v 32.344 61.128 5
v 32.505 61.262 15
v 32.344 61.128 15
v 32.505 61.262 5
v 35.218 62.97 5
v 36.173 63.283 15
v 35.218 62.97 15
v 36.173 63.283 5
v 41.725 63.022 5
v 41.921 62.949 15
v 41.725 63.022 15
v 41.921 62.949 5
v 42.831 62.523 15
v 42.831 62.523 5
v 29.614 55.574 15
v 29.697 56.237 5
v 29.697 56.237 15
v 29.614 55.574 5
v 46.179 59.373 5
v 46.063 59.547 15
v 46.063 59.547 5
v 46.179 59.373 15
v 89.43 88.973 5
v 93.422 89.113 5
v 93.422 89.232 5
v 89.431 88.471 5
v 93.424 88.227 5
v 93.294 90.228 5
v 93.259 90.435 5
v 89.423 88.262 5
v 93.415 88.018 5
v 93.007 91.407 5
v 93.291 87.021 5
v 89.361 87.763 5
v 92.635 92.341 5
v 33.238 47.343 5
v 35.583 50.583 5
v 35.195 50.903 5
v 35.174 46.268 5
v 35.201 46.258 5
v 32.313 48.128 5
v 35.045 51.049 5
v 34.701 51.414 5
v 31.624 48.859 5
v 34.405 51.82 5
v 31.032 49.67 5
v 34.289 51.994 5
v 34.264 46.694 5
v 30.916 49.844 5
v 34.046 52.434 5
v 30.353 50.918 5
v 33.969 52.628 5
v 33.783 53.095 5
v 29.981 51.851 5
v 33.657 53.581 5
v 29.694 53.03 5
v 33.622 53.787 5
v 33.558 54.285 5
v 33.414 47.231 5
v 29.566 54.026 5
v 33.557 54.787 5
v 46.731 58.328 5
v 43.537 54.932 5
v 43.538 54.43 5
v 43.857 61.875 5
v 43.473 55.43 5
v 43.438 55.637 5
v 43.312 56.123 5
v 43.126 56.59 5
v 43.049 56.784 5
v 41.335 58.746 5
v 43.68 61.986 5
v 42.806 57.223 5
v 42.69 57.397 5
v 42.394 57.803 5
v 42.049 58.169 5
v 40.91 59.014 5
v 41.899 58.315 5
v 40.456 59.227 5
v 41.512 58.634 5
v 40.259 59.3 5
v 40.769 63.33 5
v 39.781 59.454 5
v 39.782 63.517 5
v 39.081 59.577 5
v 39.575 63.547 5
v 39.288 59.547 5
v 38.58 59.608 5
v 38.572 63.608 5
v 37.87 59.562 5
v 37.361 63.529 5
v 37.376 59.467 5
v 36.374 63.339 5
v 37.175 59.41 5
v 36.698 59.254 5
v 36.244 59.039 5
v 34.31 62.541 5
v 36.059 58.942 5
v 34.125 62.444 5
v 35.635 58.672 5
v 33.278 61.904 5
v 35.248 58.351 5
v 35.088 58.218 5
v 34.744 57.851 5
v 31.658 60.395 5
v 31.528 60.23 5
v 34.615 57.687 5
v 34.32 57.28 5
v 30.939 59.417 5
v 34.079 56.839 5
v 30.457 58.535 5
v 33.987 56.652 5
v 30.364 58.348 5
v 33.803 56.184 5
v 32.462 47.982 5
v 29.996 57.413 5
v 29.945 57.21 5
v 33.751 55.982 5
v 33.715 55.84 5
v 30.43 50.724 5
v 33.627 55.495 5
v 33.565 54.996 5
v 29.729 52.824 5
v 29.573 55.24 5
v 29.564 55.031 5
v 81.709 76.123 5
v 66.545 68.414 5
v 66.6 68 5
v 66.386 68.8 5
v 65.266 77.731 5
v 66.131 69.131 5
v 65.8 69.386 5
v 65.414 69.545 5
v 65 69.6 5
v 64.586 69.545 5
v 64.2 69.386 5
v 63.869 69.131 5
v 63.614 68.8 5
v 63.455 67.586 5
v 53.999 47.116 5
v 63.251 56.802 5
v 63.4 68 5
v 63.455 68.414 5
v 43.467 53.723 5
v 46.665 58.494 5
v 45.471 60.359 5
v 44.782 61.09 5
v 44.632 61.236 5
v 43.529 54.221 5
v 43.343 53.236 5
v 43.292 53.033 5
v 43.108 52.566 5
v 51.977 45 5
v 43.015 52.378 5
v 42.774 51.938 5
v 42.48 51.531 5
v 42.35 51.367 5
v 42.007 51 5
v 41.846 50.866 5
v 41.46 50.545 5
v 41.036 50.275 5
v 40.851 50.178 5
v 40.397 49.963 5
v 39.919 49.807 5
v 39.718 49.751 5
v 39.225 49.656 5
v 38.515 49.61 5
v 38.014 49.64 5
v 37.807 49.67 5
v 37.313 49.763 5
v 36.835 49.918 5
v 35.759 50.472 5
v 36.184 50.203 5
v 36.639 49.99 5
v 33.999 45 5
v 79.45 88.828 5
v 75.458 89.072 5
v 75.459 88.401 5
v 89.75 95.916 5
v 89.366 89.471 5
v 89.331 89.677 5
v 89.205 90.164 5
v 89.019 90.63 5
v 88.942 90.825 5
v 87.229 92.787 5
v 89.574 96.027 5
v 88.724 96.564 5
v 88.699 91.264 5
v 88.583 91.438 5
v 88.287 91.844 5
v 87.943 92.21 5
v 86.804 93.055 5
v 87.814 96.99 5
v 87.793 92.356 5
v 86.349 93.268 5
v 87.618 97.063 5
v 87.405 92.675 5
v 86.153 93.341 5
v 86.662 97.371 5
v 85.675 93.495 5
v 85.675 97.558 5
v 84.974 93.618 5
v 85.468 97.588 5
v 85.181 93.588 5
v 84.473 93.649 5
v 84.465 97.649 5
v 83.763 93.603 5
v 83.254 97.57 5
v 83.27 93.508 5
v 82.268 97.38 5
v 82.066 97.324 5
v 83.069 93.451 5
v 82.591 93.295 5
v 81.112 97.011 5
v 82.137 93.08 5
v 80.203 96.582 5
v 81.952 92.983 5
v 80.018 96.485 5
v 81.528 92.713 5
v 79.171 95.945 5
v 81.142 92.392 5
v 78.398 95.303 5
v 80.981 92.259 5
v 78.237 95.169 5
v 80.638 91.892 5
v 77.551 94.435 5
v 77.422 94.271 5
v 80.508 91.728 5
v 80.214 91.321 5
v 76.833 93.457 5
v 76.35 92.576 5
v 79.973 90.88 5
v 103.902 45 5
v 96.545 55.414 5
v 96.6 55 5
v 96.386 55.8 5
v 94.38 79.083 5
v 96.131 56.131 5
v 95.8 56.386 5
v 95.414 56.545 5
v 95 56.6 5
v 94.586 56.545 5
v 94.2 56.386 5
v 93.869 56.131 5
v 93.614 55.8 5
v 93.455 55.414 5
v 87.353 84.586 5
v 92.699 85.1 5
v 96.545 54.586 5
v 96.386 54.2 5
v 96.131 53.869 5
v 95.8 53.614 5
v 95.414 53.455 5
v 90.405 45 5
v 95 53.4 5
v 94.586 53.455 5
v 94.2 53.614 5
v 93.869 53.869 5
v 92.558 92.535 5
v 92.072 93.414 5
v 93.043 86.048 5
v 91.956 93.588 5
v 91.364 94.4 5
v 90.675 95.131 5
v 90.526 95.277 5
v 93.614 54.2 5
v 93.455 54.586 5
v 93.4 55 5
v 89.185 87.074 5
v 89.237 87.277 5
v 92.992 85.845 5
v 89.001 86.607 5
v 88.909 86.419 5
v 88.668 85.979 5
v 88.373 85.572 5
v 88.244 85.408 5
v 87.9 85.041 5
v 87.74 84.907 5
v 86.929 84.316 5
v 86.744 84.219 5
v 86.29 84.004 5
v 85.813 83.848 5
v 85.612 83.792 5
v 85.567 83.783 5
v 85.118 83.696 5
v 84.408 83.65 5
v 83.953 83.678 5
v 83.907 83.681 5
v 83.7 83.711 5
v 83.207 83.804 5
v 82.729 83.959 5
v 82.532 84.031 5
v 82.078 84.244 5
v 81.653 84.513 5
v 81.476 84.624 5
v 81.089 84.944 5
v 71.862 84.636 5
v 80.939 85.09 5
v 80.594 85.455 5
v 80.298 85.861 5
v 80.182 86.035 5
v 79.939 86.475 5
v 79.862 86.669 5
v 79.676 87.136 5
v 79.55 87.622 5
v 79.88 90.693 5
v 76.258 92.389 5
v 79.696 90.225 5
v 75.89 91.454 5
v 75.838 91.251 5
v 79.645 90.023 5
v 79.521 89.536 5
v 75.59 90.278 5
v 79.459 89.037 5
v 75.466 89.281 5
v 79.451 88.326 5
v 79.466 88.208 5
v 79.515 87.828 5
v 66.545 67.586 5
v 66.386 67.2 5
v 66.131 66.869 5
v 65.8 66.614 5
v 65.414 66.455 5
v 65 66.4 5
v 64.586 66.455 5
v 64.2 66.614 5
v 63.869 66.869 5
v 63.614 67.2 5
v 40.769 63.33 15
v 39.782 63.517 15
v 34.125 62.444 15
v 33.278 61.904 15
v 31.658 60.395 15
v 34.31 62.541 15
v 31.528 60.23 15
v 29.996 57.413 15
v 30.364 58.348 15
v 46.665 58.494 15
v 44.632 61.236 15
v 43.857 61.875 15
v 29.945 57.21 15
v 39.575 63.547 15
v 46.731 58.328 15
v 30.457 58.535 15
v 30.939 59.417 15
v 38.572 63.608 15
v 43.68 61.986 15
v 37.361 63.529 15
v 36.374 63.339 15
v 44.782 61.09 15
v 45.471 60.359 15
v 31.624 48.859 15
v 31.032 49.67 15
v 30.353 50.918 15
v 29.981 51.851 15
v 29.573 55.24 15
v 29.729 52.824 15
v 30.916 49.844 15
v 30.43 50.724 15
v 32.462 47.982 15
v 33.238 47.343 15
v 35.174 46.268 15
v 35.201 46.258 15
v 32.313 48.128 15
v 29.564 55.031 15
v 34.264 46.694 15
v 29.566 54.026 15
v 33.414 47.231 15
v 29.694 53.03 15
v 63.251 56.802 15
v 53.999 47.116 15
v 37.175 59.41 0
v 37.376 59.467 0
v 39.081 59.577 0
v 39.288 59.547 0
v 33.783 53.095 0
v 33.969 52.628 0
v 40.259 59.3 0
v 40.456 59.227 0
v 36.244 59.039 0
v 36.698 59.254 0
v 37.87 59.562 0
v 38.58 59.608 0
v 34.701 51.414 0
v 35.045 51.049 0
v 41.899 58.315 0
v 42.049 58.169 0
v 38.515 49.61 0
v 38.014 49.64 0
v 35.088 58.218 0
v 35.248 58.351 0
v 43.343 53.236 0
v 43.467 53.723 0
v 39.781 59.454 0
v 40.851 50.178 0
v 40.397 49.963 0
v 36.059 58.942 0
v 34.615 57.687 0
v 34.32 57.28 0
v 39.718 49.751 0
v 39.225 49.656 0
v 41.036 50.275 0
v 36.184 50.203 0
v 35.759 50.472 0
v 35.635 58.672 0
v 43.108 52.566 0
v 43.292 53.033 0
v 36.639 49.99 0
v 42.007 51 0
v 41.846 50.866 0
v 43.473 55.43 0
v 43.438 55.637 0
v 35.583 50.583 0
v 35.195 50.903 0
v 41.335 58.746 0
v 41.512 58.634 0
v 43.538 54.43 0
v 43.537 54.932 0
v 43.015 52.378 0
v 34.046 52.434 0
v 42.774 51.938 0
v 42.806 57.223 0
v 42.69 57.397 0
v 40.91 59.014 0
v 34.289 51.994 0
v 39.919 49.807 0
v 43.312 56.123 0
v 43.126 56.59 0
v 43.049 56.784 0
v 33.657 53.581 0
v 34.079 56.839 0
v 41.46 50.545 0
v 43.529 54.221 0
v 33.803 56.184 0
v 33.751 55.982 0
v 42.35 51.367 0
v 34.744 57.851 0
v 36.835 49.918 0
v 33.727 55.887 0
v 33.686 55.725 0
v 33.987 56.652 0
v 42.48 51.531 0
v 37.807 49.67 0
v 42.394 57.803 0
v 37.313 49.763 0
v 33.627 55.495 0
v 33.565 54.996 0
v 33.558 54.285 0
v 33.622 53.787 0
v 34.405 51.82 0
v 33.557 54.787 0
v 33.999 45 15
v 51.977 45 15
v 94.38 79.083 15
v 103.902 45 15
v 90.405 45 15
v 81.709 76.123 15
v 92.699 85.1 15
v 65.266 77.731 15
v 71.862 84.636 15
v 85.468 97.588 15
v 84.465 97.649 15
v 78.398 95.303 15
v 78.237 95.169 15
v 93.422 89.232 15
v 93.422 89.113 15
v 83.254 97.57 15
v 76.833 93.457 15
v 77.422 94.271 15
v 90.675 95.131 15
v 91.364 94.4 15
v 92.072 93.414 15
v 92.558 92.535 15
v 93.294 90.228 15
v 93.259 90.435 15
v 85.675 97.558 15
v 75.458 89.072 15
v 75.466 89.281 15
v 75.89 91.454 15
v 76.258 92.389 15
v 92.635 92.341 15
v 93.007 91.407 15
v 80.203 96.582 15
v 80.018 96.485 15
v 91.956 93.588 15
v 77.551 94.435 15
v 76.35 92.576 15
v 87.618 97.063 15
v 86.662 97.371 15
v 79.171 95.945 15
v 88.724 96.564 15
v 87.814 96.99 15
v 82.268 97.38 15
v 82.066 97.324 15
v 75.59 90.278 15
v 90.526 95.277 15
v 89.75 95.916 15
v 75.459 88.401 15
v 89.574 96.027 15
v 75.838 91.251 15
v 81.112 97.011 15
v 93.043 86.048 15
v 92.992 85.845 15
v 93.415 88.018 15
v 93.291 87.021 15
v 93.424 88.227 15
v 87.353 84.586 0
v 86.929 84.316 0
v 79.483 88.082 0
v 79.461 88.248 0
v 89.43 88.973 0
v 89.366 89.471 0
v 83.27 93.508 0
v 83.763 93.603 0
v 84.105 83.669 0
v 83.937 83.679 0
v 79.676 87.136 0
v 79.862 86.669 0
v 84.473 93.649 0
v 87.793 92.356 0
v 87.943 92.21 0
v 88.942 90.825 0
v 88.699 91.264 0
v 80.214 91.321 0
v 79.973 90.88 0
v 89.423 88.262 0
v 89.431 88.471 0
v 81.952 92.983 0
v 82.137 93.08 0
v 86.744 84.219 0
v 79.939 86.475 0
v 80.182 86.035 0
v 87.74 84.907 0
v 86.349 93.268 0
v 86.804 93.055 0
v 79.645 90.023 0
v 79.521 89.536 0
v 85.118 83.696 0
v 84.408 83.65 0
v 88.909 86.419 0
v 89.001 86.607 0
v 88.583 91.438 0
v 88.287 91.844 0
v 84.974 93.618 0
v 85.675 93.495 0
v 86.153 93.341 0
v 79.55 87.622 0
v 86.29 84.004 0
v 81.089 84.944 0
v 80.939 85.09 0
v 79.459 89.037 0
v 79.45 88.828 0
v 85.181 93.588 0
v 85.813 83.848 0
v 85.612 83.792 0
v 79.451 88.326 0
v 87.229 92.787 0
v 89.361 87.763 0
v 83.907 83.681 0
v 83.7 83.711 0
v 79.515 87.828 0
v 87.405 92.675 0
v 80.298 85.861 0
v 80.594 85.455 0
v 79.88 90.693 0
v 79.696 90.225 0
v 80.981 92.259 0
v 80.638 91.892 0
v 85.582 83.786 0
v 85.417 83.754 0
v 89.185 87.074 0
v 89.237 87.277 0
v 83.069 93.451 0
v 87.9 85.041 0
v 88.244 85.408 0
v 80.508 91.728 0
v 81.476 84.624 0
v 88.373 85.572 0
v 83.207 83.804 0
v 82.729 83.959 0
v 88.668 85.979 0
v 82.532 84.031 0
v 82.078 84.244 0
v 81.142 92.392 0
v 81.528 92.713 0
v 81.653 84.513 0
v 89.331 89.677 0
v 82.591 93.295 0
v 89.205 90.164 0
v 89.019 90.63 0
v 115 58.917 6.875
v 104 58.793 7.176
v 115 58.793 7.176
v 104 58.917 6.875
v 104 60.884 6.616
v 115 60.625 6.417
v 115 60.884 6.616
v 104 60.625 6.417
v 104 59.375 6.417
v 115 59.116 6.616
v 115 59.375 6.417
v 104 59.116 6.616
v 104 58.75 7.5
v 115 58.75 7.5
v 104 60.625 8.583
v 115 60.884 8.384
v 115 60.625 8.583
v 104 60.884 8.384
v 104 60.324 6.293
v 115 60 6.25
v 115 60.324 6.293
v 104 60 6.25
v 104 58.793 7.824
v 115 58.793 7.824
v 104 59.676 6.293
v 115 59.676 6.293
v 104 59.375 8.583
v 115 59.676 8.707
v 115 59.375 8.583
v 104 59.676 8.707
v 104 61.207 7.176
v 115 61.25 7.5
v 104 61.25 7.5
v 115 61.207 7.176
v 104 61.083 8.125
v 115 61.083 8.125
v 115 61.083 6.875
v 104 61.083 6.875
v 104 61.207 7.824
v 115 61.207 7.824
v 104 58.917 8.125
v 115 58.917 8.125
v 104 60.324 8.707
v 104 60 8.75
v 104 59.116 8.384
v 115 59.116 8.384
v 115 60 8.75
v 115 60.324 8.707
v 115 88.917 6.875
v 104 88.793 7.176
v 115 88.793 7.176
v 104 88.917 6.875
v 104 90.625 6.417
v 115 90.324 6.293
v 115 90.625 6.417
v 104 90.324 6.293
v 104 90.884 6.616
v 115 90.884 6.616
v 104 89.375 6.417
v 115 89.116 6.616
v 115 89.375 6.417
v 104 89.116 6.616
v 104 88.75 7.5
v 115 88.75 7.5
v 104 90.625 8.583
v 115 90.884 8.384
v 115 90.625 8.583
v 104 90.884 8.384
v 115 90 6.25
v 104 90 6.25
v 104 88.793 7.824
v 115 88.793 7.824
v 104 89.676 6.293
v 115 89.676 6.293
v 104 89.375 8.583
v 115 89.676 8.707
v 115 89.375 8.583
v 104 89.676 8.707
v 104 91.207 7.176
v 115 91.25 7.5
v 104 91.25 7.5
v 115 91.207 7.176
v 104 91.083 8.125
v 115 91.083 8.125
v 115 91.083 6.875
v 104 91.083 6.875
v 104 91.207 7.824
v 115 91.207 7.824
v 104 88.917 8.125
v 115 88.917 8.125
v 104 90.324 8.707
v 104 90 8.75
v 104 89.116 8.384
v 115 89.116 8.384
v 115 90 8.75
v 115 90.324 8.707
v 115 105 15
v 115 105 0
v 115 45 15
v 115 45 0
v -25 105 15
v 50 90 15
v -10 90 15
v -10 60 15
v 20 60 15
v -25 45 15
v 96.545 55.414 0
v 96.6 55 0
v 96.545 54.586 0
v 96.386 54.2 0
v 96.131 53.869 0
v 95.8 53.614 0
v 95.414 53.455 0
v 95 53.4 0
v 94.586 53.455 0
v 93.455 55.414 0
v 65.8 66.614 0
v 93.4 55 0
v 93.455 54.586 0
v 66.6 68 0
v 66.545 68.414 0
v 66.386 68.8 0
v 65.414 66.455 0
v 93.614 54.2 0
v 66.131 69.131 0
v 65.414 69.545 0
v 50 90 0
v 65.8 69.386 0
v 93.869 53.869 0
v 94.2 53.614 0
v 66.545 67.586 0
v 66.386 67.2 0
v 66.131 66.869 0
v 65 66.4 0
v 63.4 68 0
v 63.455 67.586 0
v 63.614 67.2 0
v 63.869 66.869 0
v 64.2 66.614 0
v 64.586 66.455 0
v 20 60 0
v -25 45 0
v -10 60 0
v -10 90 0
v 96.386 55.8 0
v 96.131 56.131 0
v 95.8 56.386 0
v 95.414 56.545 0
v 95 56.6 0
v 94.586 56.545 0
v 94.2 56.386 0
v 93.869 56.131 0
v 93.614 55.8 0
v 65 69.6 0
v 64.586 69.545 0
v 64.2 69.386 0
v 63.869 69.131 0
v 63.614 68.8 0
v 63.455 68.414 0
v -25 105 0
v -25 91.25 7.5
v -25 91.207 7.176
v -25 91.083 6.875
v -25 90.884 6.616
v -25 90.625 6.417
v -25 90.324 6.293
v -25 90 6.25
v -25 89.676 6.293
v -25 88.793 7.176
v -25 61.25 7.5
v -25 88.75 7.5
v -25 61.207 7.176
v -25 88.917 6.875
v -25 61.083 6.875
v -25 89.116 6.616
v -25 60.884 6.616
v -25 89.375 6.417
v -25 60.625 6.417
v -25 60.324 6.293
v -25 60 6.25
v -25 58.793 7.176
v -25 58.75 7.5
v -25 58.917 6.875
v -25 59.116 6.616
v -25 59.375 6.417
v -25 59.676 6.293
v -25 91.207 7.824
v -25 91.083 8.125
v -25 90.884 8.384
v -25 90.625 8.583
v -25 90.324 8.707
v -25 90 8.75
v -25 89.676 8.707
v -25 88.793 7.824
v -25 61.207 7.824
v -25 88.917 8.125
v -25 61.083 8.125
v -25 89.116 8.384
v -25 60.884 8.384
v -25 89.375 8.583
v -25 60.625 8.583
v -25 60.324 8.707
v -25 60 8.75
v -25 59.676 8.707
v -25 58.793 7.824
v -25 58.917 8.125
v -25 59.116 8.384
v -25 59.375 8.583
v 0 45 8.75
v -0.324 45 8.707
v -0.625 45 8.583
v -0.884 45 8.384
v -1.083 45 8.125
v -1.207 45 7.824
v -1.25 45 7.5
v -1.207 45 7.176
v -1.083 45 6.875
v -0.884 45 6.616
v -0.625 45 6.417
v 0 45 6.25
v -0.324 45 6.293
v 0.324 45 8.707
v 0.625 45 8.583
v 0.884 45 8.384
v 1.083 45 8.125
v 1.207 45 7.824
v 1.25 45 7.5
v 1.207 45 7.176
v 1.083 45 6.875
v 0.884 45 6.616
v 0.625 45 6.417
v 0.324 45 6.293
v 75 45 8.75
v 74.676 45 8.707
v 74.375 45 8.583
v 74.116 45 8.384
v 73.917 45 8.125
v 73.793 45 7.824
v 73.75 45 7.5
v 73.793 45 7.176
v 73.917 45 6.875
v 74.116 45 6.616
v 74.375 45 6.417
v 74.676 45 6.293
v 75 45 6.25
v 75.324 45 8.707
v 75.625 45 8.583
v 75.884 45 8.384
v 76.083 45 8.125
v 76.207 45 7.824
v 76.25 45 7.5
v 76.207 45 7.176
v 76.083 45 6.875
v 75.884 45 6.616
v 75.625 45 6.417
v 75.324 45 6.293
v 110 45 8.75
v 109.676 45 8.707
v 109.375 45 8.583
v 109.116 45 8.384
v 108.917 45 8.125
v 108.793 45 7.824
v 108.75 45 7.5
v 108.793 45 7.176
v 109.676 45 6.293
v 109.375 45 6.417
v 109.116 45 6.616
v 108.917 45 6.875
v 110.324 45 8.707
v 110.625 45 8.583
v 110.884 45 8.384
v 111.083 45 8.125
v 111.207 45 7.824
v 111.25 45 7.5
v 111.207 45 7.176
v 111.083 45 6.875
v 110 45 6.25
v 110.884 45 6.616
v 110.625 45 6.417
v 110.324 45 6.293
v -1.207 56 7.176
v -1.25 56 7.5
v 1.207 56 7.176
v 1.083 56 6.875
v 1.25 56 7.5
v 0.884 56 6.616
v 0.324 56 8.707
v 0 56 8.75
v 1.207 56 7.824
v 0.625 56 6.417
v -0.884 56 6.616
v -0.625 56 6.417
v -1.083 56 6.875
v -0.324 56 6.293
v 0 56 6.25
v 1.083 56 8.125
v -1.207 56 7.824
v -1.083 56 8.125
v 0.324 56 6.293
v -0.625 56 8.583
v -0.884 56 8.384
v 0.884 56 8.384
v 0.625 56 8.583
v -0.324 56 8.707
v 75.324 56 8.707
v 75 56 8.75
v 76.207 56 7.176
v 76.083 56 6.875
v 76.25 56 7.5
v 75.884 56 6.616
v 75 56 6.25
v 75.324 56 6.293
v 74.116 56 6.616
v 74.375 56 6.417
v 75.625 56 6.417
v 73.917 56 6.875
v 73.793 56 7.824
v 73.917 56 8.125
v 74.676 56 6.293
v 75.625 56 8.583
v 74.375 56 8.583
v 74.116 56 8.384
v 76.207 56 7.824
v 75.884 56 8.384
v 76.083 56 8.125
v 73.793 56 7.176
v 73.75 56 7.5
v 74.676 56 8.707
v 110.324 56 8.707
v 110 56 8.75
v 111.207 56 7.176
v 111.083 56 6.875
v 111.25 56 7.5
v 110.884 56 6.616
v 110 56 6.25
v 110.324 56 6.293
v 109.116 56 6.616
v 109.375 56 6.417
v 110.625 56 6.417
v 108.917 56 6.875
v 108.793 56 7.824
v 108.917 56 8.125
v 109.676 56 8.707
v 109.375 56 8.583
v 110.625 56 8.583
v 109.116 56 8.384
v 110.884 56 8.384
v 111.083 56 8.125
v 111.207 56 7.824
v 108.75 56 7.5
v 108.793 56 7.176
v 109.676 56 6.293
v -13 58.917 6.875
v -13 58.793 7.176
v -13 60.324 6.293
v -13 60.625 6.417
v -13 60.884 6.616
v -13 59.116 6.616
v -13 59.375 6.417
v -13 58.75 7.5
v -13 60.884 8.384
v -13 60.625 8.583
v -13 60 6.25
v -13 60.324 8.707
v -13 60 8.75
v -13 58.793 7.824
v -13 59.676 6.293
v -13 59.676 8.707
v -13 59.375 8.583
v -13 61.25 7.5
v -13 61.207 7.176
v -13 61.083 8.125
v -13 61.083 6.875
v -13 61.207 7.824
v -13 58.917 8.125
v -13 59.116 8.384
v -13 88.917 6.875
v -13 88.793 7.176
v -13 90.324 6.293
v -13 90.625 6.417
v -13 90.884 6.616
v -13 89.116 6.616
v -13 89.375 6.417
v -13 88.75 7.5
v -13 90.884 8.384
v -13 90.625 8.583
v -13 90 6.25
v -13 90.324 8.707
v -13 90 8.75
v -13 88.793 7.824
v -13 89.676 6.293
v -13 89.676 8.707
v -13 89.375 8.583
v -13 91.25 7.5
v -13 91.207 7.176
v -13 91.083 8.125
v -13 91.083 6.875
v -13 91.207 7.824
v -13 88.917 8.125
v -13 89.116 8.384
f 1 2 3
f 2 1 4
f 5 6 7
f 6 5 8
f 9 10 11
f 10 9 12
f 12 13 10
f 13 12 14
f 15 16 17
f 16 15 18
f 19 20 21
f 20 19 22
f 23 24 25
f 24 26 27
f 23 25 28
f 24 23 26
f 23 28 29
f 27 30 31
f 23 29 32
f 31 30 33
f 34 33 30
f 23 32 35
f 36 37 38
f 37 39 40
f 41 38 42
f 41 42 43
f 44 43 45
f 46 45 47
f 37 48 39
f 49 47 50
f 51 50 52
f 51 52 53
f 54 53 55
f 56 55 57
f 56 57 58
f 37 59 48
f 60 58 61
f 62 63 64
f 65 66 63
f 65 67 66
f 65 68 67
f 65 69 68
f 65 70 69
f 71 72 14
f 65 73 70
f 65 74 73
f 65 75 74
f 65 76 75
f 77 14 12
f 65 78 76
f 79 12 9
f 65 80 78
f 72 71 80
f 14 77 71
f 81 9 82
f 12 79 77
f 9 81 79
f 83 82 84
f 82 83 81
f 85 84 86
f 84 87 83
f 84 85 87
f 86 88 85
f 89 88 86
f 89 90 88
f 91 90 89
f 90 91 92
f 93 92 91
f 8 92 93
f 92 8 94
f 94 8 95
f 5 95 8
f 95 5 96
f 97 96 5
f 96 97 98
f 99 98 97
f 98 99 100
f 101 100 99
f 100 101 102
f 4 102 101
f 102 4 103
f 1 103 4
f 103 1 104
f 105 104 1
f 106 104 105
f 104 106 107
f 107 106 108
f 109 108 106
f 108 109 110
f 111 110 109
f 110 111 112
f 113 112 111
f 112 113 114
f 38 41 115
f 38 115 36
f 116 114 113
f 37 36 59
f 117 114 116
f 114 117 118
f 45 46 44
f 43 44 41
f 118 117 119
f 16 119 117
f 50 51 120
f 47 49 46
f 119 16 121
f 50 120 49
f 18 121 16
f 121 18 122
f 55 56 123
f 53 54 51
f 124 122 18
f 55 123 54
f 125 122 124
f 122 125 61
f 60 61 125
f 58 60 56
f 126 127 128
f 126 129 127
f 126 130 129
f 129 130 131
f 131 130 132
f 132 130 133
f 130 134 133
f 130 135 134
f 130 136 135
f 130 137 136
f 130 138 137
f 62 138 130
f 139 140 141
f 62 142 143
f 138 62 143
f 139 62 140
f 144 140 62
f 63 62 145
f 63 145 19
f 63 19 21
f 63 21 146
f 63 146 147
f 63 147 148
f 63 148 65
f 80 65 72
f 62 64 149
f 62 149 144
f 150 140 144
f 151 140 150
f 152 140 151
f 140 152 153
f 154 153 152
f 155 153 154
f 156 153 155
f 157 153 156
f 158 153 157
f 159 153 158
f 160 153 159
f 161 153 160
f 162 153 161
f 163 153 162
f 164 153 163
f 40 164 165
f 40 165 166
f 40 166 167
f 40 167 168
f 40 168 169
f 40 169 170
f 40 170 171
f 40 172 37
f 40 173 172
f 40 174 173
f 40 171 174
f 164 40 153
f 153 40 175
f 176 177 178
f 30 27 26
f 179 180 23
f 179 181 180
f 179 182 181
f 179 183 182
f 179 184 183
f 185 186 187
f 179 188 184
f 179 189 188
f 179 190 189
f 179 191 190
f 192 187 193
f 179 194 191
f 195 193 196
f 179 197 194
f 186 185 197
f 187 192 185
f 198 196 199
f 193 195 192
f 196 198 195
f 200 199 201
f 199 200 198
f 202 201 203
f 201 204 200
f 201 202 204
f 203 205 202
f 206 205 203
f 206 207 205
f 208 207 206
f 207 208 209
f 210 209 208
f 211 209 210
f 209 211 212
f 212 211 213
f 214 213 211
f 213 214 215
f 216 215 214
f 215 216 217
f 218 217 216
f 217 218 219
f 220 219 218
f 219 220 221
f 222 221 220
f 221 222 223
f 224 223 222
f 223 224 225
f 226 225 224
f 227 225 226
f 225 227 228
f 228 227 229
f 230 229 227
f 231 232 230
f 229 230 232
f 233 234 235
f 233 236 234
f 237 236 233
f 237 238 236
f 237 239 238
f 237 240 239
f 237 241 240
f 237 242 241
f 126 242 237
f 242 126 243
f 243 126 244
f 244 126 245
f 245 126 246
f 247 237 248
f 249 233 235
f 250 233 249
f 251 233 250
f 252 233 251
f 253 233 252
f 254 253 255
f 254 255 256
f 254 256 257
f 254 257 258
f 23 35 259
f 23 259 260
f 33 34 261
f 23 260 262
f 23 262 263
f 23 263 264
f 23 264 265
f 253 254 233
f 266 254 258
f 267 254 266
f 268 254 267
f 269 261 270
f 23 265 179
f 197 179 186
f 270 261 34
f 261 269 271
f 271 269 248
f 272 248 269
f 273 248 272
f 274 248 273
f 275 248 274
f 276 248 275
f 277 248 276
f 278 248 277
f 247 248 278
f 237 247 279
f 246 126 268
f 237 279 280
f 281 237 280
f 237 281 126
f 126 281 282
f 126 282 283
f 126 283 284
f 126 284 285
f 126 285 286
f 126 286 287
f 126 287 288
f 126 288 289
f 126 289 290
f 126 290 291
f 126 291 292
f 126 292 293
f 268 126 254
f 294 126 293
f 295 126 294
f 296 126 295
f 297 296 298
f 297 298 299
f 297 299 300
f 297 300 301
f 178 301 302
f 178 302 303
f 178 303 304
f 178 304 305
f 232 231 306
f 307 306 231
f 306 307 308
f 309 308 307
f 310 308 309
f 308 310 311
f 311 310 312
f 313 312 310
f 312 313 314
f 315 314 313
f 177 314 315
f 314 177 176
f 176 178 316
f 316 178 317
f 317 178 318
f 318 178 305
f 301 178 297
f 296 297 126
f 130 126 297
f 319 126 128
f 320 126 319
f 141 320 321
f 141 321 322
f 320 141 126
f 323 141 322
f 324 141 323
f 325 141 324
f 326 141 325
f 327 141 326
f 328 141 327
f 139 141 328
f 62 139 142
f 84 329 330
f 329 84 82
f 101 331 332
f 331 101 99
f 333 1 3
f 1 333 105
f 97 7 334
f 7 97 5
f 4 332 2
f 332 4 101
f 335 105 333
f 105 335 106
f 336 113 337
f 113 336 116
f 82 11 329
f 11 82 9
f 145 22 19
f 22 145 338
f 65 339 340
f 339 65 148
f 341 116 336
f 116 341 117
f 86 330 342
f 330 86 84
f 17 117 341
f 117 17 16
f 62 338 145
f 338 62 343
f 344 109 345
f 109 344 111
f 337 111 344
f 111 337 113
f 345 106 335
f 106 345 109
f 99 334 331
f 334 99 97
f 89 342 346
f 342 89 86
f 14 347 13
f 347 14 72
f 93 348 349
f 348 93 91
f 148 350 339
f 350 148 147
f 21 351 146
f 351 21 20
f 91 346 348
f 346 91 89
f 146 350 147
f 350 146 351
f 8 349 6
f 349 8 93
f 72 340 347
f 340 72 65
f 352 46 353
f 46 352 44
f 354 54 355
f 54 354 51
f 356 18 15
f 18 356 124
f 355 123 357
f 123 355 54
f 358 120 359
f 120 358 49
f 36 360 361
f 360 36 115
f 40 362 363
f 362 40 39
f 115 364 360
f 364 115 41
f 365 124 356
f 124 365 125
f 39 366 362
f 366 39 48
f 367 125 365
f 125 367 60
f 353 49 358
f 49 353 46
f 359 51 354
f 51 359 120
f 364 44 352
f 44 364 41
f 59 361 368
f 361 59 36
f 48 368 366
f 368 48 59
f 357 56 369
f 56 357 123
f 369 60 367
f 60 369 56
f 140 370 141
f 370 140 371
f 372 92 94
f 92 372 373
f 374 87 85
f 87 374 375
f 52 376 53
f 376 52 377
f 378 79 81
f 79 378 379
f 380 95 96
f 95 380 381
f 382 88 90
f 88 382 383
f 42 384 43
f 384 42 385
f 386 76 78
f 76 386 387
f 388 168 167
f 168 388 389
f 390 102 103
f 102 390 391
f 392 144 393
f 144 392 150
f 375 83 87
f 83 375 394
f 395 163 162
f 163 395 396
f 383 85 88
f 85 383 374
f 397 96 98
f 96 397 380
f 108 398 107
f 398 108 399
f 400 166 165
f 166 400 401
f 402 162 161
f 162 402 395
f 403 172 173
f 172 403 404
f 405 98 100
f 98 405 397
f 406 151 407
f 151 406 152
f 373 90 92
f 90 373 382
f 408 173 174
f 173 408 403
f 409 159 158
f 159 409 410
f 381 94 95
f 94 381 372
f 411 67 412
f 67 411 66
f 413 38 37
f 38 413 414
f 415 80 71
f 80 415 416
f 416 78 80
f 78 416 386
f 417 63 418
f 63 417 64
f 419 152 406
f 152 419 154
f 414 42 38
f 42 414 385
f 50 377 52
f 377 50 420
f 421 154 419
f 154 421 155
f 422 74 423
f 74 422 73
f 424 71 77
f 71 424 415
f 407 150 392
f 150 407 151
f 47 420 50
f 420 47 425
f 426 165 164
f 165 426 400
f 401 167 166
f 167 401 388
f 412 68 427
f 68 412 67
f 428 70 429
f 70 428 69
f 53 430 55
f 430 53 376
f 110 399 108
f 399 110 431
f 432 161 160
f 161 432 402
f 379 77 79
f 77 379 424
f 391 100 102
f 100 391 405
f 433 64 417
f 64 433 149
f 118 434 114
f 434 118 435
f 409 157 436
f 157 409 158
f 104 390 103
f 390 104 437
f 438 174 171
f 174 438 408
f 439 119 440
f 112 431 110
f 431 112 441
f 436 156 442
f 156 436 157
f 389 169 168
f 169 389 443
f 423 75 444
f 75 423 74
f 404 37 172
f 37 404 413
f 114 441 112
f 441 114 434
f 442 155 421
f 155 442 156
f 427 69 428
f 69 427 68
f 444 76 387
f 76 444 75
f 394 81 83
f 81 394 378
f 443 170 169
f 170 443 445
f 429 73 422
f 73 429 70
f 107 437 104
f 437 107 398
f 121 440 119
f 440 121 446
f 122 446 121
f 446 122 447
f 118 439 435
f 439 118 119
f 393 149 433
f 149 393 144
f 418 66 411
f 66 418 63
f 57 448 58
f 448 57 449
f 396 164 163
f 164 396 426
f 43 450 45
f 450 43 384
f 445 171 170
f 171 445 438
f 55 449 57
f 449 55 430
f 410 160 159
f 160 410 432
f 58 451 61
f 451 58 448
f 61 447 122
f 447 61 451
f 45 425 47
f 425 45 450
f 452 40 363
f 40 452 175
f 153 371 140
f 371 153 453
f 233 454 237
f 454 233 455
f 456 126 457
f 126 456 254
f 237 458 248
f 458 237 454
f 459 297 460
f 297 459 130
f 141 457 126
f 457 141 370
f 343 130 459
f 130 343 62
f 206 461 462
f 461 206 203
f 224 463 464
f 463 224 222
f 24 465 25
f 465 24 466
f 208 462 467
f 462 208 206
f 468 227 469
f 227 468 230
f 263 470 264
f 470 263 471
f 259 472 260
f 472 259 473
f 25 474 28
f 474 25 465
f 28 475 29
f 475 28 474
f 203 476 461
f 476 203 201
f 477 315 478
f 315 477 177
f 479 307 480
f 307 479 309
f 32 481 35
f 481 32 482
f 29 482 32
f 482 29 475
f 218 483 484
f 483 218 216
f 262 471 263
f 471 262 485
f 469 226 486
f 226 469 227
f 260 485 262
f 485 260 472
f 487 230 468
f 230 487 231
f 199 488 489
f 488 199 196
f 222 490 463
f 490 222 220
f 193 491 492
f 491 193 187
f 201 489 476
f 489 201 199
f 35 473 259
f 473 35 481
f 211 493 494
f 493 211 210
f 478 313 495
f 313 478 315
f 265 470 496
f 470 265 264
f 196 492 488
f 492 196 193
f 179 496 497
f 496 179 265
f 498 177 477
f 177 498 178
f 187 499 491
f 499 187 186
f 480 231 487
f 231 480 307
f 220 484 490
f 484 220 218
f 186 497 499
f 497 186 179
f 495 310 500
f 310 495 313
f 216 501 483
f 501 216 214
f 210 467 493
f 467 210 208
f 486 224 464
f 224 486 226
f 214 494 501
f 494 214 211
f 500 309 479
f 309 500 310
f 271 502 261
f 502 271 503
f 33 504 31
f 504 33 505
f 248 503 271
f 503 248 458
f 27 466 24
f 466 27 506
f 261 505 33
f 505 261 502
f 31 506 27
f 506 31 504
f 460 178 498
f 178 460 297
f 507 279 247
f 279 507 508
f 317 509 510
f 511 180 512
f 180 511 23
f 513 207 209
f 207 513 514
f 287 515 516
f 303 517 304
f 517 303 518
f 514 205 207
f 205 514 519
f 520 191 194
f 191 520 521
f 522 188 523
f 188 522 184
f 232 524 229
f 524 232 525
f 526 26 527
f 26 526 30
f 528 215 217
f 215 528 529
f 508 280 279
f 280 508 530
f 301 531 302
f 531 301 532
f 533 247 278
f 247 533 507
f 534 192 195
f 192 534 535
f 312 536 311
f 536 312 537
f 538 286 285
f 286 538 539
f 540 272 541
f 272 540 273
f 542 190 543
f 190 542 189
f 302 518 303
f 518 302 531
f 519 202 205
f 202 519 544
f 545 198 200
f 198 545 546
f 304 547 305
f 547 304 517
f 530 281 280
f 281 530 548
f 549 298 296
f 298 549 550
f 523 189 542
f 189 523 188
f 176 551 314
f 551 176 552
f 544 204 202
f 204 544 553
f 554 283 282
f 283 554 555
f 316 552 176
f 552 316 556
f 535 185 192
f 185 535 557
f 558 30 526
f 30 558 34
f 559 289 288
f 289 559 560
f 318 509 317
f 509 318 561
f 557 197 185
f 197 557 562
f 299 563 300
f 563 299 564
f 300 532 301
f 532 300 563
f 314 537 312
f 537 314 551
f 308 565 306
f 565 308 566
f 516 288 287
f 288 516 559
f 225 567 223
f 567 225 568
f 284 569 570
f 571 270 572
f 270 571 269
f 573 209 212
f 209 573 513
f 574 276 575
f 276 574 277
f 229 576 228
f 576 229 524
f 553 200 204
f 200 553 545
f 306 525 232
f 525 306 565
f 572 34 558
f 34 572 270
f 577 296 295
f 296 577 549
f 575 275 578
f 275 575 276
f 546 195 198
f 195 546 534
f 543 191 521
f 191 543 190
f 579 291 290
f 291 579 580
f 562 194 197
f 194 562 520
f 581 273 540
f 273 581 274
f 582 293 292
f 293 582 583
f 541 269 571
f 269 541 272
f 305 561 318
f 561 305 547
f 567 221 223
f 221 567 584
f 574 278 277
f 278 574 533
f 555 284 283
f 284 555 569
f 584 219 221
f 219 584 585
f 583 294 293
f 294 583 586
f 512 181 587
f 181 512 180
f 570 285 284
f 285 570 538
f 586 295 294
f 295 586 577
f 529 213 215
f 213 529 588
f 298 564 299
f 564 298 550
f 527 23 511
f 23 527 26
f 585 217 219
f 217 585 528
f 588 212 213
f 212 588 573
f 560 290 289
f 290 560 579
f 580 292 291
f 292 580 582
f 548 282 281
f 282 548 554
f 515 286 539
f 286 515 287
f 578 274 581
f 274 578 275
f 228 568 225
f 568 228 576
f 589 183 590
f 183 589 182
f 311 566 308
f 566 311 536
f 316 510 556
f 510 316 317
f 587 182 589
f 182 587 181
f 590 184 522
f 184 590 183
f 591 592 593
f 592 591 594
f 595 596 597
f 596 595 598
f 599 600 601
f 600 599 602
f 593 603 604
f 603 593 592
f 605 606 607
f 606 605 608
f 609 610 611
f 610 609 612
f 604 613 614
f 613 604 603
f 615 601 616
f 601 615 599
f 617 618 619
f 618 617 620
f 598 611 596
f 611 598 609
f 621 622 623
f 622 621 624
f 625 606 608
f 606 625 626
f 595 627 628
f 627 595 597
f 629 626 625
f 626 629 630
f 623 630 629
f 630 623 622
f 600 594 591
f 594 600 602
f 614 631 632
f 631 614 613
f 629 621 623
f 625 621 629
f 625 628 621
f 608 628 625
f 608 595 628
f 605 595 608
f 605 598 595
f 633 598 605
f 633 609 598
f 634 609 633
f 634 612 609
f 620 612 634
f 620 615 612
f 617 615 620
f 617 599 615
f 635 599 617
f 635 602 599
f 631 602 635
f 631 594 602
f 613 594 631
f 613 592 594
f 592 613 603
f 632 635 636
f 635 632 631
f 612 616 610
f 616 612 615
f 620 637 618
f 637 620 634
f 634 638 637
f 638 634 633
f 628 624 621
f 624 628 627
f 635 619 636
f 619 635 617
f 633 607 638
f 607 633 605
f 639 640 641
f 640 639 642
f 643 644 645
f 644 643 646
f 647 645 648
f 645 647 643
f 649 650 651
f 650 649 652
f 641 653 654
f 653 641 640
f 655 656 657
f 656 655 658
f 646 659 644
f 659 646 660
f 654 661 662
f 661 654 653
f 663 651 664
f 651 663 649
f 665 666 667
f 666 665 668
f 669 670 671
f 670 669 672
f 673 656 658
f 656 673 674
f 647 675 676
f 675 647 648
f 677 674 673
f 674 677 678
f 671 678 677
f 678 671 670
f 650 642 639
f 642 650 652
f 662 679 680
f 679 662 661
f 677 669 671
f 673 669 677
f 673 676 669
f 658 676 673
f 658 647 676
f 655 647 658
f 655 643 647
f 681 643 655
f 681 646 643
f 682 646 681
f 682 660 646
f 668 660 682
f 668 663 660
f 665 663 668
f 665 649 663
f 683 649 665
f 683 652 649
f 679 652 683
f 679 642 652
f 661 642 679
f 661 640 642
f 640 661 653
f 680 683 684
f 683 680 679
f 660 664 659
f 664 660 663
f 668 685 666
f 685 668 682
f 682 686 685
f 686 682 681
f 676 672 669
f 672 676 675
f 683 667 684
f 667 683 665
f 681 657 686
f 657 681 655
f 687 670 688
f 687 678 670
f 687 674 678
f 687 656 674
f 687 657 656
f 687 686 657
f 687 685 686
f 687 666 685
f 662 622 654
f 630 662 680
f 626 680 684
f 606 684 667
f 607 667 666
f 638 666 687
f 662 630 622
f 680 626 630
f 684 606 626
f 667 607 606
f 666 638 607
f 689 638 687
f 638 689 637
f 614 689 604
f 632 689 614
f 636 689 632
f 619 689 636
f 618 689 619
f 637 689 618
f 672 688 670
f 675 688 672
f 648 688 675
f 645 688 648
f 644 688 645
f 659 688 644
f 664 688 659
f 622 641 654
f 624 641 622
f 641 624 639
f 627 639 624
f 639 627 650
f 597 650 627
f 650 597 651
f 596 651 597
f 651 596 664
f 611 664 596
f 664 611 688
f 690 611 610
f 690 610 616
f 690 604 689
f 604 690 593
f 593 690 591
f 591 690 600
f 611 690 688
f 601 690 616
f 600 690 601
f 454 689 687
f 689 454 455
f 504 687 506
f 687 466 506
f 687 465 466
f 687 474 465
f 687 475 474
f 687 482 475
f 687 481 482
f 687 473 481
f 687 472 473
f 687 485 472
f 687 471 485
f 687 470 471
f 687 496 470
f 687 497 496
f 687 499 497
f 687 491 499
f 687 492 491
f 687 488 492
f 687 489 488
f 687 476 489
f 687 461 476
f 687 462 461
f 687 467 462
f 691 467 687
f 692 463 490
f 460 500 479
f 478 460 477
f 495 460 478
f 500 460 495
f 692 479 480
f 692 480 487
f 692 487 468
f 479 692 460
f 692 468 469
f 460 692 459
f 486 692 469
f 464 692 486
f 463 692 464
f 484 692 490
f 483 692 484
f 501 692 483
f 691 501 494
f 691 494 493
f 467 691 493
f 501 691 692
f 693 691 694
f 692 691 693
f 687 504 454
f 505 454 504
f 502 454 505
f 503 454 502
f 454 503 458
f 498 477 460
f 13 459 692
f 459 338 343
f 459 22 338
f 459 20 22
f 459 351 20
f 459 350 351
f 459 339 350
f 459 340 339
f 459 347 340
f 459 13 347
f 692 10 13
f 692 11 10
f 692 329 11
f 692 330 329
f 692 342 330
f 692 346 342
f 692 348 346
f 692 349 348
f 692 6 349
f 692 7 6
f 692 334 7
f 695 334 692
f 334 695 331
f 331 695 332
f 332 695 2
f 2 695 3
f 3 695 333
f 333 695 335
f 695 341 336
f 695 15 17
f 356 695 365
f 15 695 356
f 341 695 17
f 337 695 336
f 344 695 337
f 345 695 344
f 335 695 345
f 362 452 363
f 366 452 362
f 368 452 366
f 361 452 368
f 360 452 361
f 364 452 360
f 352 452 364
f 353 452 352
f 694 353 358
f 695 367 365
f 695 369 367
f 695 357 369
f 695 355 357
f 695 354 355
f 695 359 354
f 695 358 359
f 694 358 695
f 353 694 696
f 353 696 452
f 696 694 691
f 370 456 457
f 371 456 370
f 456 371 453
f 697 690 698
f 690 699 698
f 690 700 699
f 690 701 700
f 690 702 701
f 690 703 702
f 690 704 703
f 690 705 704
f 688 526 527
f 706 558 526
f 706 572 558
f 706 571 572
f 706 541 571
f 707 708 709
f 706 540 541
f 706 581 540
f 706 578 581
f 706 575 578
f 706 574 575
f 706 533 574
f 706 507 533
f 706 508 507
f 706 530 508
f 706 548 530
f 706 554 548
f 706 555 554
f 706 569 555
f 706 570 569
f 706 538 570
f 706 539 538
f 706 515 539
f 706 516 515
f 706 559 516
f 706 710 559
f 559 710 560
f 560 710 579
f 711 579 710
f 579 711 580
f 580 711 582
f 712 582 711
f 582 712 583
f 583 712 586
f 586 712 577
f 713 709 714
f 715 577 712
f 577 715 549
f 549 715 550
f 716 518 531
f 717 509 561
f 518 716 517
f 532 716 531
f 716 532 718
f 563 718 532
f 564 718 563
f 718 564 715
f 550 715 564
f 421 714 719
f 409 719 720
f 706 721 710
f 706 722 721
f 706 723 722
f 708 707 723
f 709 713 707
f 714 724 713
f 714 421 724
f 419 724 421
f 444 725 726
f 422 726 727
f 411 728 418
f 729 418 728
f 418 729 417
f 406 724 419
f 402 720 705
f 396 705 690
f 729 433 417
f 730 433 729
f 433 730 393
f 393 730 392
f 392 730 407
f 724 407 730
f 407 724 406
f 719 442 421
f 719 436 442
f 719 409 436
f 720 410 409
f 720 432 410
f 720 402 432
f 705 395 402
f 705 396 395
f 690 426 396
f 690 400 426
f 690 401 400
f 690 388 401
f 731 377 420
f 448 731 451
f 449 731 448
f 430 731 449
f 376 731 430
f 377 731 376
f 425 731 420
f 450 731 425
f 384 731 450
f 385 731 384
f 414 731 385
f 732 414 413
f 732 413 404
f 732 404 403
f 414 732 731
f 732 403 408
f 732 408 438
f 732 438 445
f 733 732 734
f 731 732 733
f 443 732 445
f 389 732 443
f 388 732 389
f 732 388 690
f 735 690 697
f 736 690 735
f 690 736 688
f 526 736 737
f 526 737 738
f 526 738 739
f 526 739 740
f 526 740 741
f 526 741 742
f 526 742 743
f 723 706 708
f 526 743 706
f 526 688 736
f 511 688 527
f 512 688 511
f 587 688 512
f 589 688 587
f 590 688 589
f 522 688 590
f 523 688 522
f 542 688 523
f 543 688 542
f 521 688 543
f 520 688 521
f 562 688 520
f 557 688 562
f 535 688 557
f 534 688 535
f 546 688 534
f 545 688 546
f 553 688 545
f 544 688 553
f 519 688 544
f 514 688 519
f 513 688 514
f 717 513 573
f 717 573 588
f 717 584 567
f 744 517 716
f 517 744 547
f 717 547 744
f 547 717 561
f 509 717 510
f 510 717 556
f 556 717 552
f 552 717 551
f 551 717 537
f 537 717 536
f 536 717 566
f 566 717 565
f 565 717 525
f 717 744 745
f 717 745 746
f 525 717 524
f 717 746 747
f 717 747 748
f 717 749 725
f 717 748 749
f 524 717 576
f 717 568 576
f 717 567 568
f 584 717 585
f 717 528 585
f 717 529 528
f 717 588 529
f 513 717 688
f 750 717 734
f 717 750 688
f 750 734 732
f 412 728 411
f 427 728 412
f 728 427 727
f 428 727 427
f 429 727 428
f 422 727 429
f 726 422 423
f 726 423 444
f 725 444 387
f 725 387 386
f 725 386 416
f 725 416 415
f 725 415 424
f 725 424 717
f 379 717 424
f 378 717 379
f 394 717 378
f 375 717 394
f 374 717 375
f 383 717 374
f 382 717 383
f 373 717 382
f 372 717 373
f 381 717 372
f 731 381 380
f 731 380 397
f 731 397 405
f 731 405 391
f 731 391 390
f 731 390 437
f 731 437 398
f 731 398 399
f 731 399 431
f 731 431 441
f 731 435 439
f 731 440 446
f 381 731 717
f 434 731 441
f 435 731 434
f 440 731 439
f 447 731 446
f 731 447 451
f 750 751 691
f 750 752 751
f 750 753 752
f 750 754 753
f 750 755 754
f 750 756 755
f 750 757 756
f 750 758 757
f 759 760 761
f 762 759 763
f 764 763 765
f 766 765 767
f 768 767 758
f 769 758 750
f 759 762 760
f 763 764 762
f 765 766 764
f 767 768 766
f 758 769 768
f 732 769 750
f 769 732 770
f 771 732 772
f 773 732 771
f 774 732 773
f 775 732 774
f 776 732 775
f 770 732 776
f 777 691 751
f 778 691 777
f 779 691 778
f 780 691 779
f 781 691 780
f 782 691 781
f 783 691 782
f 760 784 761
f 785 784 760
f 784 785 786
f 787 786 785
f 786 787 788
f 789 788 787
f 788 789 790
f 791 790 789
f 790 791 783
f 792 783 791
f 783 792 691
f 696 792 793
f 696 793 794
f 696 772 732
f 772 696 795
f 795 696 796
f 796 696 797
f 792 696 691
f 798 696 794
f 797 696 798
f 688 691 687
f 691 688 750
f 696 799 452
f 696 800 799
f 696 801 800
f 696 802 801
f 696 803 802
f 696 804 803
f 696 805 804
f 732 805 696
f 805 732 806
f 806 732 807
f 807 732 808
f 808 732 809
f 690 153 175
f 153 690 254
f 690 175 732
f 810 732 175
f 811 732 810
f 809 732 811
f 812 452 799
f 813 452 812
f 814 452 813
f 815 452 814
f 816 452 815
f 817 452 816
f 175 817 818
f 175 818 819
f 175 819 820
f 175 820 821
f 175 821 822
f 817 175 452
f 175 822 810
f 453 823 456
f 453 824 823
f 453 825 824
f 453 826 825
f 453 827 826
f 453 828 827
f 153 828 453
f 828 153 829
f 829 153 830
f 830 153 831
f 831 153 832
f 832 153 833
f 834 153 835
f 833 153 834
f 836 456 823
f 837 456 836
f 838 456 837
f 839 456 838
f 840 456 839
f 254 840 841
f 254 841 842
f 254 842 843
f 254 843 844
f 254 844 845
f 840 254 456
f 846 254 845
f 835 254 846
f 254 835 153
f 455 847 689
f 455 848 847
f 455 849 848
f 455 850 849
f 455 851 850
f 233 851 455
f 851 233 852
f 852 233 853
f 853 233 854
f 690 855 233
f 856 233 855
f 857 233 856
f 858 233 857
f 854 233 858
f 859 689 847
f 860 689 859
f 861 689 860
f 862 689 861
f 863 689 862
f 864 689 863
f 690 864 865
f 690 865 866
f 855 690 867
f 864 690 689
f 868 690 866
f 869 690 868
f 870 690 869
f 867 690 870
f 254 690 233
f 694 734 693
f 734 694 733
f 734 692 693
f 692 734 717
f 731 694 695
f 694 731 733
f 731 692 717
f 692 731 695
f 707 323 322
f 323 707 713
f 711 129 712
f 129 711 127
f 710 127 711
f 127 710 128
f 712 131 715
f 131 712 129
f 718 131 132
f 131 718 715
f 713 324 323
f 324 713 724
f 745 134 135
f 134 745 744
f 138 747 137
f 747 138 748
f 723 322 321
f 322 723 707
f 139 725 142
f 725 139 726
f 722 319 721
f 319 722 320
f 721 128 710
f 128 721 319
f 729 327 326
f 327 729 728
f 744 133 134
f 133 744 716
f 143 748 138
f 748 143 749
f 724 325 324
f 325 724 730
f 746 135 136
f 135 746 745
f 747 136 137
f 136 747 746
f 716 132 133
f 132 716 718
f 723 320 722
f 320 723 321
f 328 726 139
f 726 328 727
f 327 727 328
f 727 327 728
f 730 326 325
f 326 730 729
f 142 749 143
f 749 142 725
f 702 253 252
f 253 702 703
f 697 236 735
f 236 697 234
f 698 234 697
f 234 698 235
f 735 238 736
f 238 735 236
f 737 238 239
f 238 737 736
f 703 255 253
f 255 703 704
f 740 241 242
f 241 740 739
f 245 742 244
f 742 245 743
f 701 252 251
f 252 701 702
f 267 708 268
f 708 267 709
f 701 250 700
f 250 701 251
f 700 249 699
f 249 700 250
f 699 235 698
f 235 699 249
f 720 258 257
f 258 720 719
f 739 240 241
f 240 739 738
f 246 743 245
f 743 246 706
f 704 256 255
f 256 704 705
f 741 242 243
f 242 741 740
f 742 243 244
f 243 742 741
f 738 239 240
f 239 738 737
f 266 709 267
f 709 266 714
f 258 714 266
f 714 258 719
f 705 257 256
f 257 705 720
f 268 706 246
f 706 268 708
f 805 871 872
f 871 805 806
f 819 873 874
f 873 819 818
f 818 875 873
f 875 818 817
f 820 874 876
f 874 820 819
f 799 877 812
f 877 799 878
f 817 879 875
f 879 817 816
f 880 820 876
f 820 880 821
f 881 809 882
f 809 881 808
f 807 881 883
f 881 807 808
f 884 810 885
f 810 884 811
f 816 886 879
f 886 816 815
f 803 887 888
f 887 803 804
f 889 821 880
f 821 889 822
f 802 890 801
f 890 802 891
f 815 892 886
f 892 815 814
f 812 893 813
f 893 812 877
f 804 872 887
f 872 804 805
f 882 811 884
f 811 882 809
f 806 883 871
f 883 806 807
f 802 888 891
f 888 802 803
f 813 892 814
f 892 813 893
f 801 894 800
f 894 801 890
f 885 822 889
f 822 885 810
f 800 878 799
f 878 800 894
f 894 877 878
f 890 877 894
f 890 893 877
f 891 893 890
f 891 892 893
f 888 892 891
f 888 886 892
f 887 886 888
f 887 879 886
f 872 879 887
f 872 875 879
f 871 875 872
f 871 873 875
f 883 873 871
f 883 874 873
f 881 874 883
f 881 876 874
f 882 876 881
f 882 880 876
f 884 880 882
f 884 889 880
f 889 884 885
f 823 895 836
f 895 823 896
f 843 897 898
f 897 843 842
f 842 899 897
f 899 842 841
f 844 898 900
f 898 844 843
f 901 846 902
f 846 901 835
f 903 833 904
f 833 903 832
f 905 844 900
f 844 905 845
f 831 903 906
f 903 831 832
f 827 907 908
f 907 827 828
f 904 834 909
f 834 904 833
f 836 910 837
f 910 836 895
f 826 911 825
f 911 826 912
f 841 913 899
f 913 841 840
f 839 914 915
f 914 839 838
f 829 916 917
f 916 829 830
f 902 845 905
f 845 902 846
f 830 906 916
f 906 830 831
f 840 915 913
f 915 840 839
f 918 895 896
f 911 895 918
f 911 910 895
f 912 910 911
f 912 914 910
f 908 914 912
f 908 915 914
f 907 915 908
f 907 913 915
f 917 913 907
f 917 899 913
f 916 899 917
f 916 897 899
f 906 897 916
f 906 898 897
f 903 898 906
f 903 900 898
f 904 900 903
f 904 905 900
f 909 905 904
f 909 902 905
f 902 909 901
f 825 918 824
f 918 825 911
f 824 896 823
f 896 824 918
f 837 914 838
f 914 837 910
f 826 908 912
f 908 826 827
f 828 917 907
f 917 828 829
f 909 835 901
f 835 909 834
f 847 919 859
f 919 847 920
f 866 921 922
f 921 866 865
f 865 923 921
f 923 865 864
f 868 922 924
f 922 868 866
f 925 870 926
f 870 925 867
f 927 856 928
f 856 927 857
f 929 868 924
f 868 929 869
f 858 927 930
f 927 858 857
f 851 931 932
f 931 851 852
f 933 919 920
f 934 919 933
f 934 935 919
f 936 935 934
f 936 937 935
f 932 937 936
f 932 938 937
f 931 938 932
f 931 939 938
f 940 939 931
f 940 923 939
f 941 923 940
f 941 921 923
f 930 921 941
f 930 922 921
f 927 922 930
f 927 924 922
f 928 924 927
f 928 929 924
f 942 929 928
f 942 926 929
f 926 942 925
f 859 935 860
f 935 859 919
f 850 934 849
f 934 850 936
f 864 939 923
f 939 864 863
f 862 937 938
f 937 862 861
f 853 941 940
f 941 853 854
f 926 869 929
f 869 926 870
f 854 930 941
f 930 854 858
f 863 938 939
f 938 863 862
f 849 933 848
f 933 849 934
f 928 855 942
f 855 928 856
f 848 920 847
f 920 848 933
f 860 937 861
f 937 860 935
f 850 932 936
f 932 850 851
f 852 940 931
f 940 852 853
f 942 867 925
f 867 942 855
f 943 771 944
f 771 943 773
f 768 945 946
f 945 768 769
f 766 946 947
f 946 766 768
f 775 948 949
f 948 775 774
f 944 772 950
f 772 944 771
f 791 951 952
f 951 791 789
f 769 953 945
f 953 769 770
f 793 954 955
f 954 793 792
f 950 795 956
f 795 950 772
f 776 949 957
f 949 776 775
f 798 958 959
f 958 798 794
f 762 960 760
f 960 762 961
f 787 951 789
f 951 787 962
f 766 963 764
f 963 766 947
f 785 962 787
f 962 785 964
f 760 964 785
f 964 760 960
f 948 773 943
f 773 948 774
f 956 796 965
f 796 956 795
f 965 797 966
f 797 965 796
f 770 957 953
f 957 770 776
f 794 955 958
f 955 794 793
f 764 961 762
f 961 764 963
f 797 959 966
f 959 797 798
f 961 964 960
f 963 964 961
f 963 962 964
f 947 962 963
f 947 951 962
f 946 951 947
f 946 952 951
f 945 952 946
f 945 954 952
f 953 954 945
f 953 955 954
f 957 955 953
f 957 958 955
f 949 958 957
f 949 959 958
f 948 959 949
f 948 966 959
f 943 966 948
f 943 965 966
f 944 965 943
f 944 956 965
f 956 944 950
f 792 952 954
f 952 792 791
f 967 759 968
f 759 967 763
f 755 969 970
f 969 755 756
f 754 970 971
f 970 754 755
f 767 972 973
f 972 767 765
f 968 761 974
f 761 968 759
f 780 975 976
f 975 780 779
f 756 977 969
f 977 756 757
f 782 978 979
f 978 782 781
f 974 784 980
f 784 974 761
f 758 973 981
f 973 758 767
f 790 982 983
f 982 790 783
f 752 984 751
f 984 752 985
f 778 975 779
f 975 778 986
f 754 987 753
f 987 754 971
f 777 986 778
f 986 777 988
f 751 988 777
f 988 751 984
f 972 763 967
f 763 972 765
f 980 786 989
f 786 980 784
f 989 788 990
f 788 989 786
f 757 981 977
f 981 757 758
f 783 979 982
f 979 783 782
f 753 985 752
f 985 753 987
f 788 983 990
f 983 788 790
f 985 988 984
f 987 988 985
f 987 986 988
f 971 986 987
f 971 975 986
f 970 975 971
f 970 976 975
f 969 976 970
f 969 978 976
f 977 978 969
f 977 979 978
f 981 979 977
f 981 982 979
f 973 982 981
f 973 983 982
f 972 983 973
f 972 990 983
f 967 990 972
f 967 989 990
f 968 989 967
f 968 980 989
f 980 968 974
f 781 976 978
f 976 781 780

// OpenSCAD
difference(){
    
translate([-25,45,0])cube([140,60,15]);

translate([0,0,5])rotate([0,0,3.71])
minkowski($fn=30){
    bogie();
    cylinder(r=1,h=0.001);
}
translate([-10,60,-1])cube([30,30,20]);
translate([0,0,-1])linear_extrude(h=20){
    polygon([[20,60],[20,60],[50,90],[20,90]]);
}

translate([65,68,-1])cylinder(d=3.2,h=12);
translate([95,55,-1])cylinder(d=3.2,h=12);

$fn=24;

translate([0,44,7.5])
rotate([-90,0,0])cylinder(d=2.5,h=12);
translate([75,44,7.5])
rotate([-90,0,0])cylinder(d=2.5,h=12);
translate([110,44,7.5])
rotate([-90,0,0])cylinder(d=2.5,h=12);

translate([-25,60,7.5])
rotate([0,90,0])cylinder(d=2.5,h=12);
translate([-25,90,7.5])
rotate([0,90,0])cylinder(d=2.5,h=12);

translate([129,0,0]){
translate([-25,60,7.5])
rotate([0,90,0])cylinder(d=2.5,h=12);
translate([-25,90,7.5])
rotate([0,90,0])cylinder(d=2.5,h=12);
}
}

//translate([-25,45,0])cube([15,60,15]);
//translate([-25,90,0])cube([95,15,15]);

module bogie(){

scale([1,1,2.5]){
$fn=50;

translate([90,83,0])
union(){
cylinder(d=16,h=8);
translate([0,0,-6])cylinder(d=8,h=10);
}

translate([42,52,0])
union(){
cylinder(d=16,h=8);
translate([0,0,-6])cylinder(d=8,h=10);
}

rotate([0,0,42.6])
translate([3,-5.5,0])cube([116,11,4]);

translate([108,0,0])rotate([0,0,101.9])
translate([3,-5.5,0])cube([78,11,4]);
}

}
